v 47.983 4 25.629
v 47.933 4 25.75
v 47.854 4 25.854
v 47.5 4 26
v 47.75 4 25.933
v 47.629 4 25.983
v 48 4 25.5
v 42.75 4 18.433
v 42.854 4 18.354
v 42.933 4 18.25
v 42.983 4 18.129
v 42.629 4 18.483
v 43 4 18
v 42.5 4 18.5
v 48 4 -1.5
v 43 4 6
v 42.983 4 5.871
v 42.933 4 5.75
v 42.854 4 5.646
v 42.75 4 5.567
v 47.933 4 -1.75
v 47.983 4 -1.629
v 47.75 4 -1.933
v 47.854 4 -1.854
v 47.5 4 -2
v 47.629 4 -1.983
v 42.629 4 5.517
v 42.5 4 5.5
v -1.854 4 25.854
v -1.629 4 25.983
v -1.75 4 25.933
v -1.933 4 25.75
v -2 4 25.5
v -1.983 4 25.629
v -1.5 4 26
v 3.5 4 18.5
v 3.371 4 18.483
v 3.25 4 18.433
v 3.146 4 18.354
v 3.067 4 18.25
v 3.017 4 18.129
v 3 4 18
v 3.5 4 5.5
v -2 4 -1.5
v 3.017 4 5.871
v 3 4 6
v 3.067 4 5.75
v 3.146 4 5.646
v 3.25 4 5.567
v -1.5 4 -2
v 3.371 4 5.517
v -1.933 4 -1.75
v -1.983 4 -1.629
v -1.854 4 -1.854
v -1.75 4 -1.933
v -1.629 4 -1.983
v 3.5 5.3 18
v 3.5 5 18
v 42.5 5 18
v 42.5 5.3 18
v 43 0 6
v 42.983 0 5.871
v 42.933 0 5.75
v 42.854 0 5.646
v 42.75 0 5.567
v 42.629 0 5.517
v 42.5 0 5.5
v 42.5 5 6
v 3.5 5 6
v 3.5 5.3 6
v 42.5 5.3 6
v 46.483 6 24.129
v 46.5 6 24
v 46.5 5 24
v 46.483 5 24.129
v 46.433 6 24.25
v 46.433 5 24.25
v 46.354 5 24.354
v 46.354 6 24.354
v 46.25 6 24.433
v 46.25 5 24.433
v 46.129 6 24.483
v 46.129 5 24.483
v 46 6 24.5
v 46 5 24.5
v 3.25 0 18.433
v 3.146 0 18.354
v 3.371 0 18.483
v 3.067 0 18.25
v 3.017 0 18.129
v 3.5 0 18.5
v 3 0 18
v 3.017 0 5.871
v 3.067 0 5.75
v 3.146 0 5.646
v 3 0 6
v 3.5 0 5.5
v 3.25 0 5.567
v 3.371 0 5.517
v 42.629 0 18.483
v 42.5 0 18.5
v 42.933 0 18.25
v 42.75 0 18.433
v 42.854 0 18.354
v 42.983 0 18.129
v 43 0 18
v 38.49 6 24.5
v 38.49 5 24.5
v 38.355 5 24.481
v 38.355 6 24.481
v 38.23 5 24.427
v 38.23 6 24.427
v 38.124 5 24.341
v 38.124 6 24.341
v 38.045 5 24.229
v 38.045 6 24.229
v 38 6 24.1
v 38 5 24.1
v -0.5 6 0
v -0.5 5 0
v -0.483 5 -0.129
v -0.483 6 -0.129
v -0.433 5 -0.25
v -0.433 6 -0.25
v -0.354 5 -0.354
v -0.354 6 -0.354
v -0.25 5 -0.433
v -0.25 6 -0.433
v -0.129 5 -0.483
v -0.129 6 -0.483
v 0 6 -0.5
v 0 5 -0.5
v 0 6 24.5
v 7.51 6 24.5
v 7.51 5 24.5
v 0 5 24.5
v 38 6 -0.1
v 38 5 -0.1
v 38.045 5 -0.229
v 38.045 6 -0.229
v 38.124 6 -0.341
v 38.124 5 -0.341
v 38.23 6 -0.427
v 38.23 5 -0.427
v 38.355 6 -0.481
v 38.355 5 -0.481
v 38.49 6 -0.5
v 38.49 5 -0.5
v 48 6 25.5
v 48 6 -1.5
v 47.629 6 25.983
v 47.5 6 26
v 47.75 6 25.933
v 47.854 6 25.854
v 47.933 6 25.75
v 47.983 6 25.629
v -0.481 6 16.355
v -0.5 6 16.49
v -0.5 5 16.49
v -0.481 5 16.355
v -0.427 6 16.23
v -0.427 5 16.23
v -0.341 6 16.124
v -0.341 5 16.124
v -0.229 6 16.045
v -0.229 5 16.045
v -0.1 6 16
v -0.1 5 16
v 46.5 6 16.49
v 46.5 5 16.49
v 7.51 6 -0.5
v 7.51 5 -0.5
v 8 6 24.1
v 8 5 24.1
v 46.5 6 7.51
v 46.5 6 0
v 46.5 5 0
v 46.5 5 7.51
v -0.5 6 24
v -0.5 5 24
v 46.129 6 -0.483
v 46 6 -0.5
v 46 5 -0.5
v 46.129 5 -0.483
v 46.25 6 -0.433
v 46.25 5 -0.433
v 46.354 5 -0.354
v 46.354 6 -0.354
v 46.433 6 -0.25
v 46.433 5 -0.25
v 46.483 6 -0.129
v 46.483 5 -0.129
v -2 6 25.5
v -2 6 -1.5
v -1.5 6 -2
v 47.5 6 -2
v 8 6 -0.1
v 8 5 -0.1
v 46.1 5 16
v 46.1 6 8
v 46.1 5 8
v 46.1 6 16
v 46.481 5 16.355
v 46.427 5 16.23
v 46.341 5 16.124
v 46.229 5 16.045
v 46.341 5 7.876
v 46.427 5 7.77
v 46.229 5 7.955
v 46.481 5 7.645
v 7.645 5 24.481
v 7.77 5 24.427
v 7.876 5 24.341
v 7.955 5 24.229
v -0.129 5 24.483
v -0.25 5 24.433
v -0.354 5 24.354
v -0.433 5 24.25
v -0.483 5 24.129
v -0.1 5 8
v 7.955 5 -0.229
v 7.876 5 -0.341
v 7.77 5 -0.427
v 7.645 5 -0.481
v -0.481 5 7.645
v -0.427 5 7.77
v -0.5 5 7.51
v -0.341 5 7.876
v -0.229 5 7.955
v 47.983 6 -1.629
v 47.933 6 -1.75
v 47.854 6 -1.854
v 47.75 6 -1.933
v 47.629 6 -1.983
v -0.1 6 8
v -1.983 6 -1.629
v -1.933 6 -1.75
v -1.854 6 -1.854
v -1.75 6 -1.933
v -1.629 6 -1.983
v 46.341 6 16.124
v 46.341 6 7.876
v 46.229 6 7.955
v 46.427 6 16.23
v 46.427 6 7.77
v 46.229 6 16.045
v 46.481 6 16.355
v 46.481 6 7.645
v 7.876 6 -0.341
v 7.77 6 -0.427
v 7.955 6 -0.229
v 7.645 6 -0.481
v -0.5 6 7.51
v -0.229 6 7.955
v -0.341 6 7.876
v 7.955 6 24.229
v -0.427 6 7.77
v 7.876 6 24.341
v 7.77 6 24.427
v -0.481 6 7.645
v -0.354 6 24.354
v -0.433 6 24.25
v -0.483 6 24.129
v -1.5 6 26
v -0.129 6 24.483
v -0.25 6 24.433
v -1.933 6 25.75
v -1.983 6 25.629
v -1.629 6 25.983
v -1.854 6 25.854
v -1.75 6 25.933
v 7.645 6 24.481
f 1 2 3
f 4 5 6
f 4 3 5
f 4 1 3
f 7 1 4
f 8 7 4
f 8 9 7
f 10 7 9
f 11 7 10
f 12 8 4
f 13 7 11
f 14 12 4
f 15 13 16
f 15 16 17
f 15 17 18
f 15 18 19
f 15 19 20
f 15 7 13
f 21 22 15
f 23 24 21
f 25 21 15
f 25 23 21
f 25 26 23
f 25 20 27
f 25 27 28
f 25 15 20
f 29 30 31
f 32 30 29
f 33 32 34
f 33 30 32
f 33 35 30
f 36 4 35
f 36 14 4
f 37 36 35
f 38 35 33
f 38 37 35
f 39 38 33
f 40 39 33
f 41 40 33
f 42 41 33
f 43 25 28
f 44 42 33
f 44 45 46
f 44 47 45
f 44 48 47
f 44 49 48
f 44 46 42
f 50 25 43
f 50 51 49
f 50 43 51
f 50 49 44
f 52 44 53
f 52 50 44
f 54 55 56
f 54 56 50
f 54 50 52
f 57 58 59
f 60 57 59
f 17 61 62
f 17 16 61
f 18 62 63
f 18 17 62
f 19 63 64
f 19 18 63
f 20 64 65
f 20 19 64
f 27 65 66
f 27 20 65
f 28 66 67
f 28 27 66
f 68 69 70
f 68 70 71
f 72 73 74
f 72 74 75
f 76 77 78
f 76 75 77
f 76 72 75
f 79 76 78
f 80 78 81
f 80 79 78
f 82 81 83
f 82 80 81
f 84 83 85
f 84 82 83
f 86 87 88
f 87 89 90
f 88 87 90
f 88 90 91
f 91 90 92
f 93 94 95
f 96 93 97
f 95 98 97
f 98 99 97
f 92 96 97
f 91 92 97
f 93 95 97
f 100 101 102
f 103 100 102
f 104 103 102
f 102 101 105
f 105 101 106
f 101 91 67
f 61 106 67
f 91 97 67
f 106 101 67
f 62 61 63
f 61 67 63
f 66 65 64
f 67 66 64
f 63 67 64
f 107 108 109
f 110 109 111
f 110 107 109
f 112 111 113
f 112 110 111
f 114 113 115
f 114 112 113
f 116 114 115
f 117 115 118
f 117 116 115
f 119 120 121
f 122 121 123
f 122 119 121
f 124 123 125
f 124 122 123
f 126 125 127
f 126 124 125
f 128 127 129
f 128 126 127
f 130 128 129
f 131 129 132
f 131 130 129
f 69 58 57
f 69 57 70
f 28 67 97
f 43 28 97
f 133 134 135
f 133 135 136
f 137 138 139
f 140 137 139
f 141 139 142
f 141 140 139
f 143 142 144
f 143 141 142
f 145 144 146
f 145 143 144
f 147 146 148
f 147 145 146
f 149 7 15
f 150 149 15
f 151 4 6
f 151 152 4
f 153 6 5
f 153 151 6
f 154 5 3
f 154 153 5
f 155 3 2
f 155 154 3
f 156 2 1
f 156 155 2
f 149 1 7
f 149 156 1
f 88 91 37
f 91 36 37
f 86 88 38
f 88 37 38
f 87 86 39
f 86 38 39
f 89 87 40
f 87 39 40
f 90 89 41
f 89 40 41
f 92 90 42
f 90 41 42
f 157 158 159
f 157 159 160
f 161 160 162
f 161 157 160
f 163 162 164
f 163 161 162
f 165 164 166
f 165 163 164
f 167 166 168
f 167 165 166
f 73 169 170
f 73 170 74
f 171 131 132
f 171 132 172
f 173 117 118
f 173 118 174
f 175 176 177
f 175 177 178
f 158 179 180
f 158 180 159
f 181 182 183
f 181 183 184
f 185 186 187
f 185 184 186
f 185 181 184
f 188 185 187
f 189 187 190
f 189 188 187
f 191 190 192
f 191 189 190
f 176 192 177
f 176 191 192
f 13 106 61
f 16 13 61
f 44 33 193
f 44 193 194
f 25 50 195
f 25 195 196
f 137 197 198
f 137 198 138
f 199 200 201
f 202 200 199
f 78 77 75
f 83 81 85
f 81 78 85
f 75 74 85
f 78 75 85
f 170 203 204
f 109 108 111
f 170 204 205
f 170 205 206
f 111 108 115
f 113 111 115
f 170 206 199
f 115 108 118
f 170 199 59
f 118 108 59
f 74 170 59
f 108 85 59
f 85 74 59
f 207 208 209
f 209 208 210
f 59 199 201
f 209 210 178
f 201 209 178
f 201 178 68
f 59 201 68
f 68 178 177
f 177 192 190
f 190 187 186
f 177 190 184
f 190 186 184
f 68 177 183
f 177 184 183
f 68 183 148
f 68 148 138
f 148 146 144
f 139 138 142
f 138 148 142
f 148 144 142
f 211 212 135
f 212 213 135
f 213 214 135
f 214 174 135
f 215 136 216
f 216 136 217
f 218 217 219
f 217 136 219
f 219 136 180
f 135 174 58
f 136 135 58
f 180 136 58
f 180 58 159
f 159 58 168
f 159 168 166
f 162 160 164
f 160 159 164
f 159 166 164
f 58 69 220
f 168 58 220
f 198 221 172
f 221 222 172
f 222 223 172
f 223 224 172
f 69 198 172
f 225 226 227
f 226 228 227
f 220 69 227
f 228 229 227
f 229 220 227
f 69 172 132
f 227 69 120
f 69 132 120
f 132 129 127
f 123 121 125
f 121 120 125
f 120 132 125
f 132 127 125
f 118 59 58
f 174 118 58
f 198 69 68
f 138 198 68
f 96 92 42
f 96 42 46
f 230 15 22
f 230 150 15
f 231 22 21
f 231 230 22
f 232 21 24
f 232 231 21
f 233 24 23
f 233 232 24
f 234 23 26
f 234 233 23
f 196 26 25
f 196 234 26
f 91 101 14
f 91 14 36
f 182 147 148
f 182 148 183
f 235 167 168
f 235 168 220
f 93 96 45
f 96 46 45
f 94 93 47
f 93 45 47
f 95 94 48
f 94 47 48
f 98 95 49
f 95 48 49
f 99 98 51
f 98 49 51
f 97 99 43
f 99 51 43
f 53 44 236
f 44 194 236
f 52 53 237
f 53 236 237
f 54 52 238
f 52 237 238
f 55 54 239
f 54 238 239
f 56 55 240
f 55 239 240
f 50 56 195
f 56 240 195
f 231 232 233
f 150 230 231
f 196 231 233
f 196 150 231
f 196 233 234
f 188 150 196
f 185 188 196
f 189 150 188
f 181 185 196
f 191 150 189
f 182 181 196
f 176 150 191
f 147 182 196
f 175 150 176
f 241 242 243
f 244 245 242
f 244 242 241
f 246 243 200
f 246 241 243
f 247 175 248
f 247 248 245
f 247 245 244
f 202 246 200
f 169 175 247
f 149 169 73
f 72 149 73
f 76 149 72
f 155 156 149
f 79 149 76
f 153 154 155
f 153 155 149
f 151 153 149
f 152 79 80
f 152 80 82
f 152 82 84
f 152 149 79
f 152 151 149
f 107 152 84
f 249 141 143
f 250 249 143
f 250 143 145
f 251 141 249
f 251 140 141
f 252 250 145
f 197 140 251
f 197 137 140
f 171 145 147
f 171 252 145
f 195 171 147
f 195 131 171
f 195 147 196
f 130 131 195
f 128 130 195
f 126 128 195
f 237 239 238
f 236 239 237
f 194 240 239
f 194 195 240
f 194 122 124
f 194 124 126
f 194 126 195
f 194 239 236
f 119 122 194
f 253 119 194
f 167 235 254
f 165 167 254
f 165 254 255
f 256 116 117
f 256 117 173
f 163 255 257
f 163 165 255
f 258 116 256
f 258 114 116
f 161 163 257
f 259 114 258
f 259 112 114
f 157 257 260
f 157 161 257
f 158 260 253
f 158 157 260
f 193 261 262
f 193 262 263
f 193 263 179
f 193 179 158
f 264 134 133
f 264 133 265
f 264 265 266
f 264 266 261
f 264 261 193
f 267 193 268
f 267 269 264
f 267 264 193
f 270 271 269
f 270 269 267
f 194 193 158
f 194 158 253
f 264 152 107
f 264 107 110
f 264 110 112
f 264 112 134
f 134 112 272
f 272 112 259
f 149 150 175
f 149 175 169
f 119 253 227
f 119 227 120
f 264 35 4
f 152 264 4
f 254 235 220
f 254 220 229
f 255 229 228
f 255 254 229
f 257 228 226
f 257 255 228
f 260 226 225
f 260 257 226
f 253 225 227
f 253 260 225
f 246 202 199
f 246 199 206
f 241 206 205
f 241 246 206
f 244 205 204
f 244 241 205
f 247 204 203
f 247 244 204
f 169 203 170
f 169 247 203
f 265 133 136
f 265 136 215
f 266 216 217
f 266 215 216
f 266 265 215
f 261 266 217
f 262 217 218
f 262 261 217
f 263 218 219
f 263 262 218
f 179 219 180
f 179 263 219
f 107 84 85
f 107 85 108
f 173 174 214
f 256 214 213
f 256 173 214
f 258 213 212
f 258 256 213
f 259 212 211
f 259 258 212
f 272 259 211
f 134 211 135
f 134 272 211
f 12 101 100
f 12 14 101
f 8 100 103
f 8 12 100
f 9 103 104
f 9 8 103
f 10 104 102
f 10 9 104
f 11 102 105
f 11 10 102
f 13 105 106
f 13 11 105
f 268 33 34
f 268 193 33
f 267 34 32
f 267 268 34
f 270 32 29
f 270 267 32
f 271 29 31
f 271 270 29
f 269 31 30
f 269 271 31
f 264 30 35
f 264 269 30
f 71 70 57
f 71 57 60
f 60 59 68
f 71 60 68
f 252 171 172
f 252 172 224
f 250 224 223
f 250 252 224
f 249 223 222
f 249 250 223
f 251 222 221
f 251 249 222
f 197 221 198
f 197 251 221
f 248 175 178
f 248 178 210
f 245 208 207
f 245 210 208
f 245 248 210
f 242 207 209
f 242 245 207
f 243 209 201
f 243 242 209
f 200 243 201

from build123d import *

# Parameters (mm, degrees)
SKETCH_1_W           = 50
SKETCH_1_H           = 28
EXTRUDE_1_DEPTH      = 6
CUT_EXTRUDE_1_DEPTH  = 1
FILLET_3_R           = 0.5
SKETCH_5_OUTSIDE_W   = 63.524
SKETCH_5_OUTSIDE_H   = 41.524
SKETCH_5_OUTSIDE_W_2 = 40
SKETCH_5_OUTSIDE_H_2 = 13
CUT_EXTRUDE_2_DEPTH  = 4
FILLET_1_R           = 0.5
SKETCH_6_W           = 39
SKETCH_6_H           = 12
EXTRUDE_2_DEPTH      = 0.3


with BuildPart() as part:
    # 草图1 → 凸台-拉伸1 (new body)
    with BuildSketch(Plane(origin=(0, 0, 0), x_dir=(1, 0, 0), z_dir=(0, 1, 0))):
        with Locations((23, -12)):
            Rectangle(SKETCH_1_W, SKETCH_1_H)
    extrude(amount=EXTRUDE_1_DEPTH)

    # 草图3 → 切除-拉伸1 (cut)
    with BuildSketch(Plane(origin=(0, 6, 0), x_dir=(1, 0, 0), z_dir=(0, 1, 0))):
        Polygon((-0.5, 0.5), (8, 0.5), (8, 0.1), (38, 0.1), (38, 0.5), (46.5, 0.5), (46.5, -8), (46.1, -8), (46.1, -16), (46.5, -16), (46.5, -24.5), (38, -24.5), (38, -24.1), (8, -24.1), (8, -24.5), (-0.5, -24.5), (-0.5, -16), (-0.1, -16), (-0.1, -8), (-0.5, -8), align=None)
    extrude(amount=-CUT_EXTRUDE_1_DEPTH, mode=Mode.SUBTRACT)

    # 圆角3
    # the kernel refuses this fillet: 0.5 mm, written as the material it adds along each edge
    with BuildSketch(Plane(origin=(38, 6, -0.5), x_dir=(1.6520118606416786e-12, 0, 1.0), z_dir=(0, -1, 0)), Plane(origin=(46.5, 6, 16), x_dir=(-1.0, 0, 1.5276668818837323e-12), z_dir=(0, -1, 0)), Plane(origin=(8, 6, 24.5), x_dir=(-1.5765166949672239e-12, 0, -1.0), z_dir=(0, -1, 0)), Plane(origin=(-0.5, 6, 8), x_dir=(1.0, 0, -1.5831780331149617e-12), z_dir=(0, -1, 0))) as fillet_3_piece_1:
        with BuildLine():
            CenterArc((0.5, -0.489897949), FILLET_3_R, 101.536959033, 78.463040967)
            Line((0, -0.489897949), (-0.01, -0.489897949))
            Line((-0.01, -0.489897949), (-0.01, 0))
            Line((-0.01, 0), (0, 0.01))
            ThreePointArc((0, 0.01), (0.2, 0.01), (0.398, 0.009797959))
            Line((0.398, 0.009797959), (0.4, 0))
        make_face()
    extrude(amount=2.224744871)
    with BuildSketch(Plane(origin=(46.5, 6, 8), x_dir=(0, 0, -1), z_dir=(0, -1, 0)), Plane(origin=(38, 6, 24.5), x_dir=(1, 0, 0), z_dir=(0, -1, 0)), Plane(origin=(-0.5, 6, 16), x_dir=(0, 0, 1), z_dir=(0, -1, 0)), Plane(origin=(8, 6, -0.5), x_dir=(-1, 0, 0), z_dir=(0, -1, 0))) as fillet_3_piece_2:
        with BuildLine():
            CenterArc((0.489897949, -0.5), FILLET_3_R, 90, 78.463040967)
            Line((0, -0.4), (-0.009797959, -0.398))
            ThreePointArc((-0.009797959, -0.398), (-0.01, -0.2), (-0.01, 0))
            Line((-0.01, 0), (0, 0.01))
            Line((0, 0.01), (0.489897949, 0.01))
            Line((0.489897949, 0.01), (0.489897949, 0))
        make_face()
    extrude(amount=2.224744871)
    with BuildSketch(Plane(origin=(46.5, 6, -0.5), x_dir=(-1, 0, 0), z_dir=(0, -1, 0)), Plane(origin=(46.5, 6, 24.5), x_dir=(0, 0, -1), z_dir=(0, -1, 0)), Plane(origin=(-0.5, 6, 24.5), x_dir=(1, 0, 0), z_dir=(0, -1, 0))) as fillet_3_piece_3:
        with BuildLine():
            CenterArc((FILLET_3_R, -FILLET_3_R), FILLET_3_R, 90, 90)
            Line((0, -FILLET_3_R), (-FILLET_3_R * 0.02, -FILLET_3_R))
            Line((-FILLET_3_R * 0.02, -FILLET_3_R), (-FILLET_3_R * 0.02, FILLET_3_R * 0.02))
            Line((-FILLET_3_R * 0.02, FILLET_3_R * 0.02), (FILLET_3_R, FILLET_3_R * 0.02))
            Line((FILLET_3_R, FILLET_3_R * 0.02), (FILLET_3_R, 0))
        make_face()
    extrude(amount=2.25)
    with BuildSketch(Plane(origin=(-0.5, 6, -0.5), x_dir=(1, 0, 0), z_dir=(0, -1, 0))) as fillet_3_piece_4:
        with BuildLine():
            CenterArc((FILLET_3_R, FILLET_3_R), FILLET_3_R, 180, 90)
            Line((0, FILLET_3_R), (-FILLET_3_R * 0.02, FILLET_3_R))
            Line((-FILLET_3_R * 0.02, FILLET_3_R), (-FILLET_3_R * 0.02, -FILLET_3_R * 0.02))
            Line((-FILLET_3_R * 0.02, -FILLET_3_R * 0.02), (FILLET_3_R, -FILLET_3_R * 0.02))
            Line((FILLET_3_R, -FILLET_3_R * 0.02), (FILLET_3_R, 0))
        make_face()
    extrude(amount=2.25)

    # 草图5 outside → 切除-拉伸2 (cut)
    with BuildSketch(Plane(origin=(0, 0, 0), x_dir=(-1, 0, 0), z_dir=(0, -1, 0))):
        with Locations((-23, -12)):
            Rectangle(SKETCH_5_OUTSIDE_W, SKETCH_5_OUTSIDE_H)
        with Locations((-23, -12)):
            Rectangle(SKETCH_5_OUTSIDE_W_2, SKETCH_5_OUTSIDE_H_2, mode=Mode.SUBTRACT)
    extrude(amount=-CUT_EXTRUDE_2_DEPTH, mode=Mode.SUBTRACT)

    # 圆角1
    fillet_1_edges = [part.edges().sort_by_distance(p)[0] for p in [
        (43, 2, 5.5),
        (3, 2, 5.5),
        (3, 2, 18.5),
        (43, 2, 18.5),
        (-2, 5, -2),
        (48, 5, -2),
        (48, 5, 26),
        (-2, 5, 26),
    ]]
    fillet(fillet_1_edges, radius=FILLET_1_R)

    # 草图6 → 凸台-拉伸2 (add)
    with BuildSketch(Plane(origin=(0, 5, 0), x_dir=(1, 0, 0), z_dir=(0, 1, 0))):
        with Locations((23, -12)):
            Rectangle(SKETCH_6_W, SKETCH_6_H)
    extrude(amount=EXTRUDE_2_DEPTH)


solid = part.part
